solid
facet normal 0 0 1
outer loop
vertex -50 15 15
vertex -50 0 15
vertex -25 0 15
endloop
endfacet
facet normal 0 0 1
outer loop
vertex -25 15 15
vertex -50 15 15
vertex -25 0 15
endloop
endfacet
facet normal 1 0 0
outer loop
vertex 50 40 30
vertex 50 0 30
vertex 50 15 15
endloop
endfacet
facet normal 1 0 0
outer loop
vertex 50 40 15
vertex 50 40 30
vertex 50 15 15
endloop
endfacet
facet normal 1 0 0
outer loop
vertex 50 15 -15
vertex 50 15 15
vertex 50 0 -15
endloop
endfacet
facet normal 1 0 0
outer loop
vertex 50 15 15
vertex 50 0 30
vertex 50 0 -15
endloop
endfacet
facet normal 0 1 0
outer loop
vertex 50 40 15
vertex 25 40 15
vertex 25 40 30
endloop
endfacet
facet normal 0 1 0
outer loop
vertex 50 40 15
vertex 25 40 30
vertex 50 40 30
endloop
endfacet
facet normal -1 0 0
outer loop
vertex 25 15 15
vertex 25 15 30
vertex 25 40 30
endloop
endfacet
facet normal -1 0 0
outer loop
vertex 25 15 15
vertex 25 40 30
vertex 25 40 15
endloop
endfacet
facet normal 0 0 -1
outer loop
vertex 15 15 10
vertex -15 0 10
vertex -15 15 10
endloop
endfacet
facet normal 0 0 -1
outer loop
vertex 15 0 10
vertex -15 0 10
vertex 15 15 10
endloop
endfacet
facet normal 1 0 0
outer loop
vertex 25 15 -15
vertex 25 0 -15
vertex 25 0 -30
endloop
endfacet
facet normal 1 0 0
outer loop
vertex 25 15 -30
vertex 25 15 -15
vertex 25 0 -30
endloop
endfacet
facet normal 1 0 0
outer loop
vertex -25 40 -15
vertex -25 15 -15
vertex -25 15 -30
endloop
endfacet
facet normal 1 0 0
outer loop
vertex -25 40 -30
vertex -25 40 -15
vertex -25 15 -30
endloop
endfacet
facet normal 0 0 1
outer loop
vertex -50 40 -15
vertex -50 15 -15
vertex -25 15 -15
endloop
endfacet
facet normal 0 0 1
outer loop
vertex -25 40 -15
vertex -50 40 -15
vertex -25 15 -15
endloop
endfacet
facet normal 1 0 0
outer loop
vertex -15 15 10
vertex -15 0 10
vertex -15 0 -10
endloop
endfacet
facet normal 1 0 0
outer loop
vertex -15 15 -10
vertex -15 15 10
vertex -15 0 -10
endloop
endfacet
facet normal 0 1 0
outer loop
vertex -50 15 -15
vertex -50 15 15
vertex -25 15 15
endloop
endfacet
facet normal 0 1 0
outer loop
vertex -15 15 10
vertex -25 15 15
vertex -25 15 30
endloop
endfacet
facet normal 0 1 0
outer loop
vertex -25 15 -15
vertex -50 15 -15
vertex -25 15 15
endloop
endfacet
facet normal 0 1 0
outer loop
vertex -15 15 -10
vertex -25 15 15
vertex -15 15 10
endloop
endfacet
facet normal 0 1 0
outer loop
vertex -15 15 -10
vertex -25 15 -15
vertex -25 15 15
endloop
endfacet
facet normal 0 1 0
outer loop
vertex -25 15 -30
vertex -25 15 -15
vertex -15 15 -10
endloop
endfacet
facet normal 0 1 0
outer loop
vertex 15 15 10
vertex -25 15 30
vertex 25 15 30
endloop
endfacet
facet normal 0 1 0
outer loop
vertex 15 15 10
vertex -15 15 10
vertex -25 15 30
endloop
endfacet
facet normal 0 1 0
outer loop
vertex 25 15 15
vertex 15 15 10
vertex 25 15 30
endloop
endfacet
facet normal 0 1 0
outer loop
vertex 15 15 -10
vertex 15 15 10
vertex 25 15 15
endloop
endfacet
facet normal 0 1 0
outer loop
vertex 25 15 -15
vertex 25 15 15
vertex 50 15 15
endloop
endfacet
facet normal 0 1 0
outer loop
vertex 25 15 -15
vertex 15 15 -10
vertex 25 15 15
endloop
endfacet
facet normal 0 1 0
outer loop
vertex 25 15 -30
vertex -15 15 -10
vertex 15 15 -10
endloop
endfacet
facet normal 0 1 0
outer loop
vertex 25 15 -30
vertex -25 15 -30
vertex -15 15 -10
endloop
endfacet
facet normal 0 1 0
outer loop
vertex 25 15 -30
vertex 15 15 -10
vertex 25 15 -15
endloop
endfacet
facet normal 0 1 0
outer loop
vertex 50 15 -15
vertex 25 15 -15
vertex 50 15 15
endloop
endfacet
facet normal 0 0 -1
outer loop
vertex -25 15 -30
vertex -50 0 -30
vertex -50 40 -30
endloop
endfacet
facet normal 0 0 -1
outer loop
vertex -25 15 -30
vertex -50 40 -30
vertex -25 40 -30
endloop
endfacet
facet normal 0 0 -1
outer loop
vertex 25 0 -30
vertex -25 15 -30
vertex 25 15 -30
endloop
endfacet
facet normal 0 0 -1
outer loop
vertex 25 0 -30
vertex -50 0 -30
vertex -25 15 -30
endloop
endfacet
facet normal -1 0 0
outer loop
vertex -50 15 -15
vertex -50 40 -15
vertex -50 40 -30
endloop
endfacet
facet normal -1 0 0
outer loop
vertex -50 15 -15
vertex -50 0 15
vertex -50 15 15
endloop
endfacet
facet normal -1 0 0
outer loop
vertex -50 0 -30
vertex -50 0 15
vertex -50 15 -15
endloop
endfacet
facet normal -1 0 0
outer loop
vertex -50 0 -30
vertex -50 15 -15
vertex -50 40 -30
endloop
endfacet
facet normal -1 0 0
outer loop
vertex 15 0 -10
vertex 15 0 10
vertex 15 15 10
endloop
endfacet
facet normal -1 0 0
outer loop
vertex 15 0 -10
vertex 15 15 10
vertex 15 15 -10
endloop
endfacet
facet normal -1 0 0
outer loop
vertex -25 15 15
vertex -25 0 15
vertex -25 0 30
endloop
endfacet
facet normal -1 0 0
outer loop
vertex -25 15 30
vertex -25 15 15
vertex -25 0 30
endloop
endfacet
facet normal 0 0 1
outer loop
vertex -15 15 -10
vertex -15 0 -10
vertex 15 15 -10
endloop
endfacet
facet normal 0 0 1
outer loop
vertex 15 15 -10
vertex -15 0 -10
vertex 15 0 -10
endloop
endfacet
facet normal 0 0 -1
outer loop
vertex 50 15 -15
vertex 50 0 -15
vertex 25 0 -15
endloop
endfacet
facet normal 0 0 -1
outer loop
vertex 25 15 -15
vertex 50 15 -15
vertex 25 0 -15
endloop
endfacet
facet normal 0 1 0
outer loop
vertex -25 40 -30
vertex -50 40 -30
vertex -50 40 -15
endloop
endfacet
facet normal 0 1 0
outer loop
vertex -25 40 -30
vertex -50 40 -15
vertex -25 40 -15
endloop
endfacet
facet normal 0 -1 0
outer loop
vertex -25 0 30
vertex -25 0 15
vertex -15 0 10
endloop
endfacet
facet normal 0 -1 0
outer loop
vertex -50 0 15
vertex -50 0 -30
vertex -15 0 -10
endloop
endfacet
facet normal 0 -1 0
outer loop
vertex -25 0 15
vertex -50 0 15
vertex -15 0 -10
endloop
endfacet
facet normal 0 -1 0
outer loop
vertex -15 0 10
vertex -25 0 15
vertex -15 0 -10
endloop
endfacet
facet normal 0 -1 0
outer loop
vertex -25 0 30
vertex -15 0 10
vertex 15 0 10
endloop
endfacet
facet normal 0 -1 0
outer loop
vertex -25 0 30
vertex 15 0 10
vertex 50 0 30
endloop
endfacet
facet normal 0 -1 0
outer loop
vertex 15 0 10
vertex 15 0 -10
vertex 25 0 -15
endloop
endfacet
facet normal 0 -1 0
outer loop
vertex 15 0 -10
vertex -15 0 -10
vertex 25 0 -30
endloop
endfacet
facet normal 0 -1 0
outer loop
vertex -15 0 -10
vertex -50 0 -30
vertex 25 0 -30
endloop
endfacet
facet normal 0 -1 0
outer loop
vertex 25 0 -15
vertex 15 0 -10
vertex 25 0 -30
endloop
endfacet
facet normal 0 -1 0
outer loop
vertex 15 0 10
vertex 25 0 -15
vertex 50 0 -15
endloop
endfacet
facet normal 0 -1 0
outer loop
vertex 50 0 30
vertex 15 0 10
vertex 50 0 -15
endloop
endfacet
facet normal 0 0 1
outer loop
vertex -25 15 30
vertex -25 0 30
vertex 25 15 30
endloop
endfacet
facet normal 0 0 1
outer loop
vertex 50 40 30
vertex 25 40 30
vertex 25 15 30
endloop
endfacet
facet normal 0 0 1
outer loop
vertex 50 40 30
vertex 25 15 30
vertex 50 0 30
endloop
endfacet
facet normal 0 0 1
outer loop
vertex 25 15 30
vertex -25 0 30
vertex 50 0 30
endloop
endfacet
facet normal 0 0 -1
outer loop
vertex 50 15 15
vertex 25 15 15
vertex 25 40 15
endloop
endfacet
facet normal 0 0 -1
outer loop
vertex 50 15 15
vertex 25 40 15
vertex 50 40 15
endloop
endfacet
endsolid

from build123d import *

# Parameters (mm, degrees)
SKETCH1_W           = 30
SKETCH1_H           = 20
BOSS_EXTRUDE1_DEPTH = 15
SKETCH1_3_W         = 25
SKETCH1_3_H         = 15
BOSS_EXTRUDE2_DEPTH = 40


with BuildPart() as part:
    # Sketch1 → Boss-Extrude1 (new body)
    with BuildSketch(Plane(origin=(0, 0, 0), x_dir=(1, 0, 0), z_dir=(0, 1, 0))):
        Polygon((-25, -15), (-25, -30), (25, -30), (25, -15), (50, -15), (50, 15), (25, 15), (25, 30), (-25, 30), (-25, 15), (-50, 15), (-50, -15), align=None)
        Rectangle(SKETCH1_W, SKETCH1_H, mode=Mode.SUBTRACT)
    extrude(amount=BOSS_EXTRUDE1_DEPTH)

    # Sketch1<3> → Boss-Extrude2 (add)
    with BuildSketch(Plane(origin=(0, 0, 0), x_dir=(1, 0, 0), z_dir=(0, 1, 0))):
        with Locations((-37.5, 22.5)):
            Rectangle(SKETCH1_3_W, SKETCH1_3_H)
        with Locations((37.5, -22.5)):
            Rectangle(SKETCH1_3_W, SKETCH1_3_H)
    extrude(amount=BOSS_EXTRUDE2_DEPTH)


solid = part.part
